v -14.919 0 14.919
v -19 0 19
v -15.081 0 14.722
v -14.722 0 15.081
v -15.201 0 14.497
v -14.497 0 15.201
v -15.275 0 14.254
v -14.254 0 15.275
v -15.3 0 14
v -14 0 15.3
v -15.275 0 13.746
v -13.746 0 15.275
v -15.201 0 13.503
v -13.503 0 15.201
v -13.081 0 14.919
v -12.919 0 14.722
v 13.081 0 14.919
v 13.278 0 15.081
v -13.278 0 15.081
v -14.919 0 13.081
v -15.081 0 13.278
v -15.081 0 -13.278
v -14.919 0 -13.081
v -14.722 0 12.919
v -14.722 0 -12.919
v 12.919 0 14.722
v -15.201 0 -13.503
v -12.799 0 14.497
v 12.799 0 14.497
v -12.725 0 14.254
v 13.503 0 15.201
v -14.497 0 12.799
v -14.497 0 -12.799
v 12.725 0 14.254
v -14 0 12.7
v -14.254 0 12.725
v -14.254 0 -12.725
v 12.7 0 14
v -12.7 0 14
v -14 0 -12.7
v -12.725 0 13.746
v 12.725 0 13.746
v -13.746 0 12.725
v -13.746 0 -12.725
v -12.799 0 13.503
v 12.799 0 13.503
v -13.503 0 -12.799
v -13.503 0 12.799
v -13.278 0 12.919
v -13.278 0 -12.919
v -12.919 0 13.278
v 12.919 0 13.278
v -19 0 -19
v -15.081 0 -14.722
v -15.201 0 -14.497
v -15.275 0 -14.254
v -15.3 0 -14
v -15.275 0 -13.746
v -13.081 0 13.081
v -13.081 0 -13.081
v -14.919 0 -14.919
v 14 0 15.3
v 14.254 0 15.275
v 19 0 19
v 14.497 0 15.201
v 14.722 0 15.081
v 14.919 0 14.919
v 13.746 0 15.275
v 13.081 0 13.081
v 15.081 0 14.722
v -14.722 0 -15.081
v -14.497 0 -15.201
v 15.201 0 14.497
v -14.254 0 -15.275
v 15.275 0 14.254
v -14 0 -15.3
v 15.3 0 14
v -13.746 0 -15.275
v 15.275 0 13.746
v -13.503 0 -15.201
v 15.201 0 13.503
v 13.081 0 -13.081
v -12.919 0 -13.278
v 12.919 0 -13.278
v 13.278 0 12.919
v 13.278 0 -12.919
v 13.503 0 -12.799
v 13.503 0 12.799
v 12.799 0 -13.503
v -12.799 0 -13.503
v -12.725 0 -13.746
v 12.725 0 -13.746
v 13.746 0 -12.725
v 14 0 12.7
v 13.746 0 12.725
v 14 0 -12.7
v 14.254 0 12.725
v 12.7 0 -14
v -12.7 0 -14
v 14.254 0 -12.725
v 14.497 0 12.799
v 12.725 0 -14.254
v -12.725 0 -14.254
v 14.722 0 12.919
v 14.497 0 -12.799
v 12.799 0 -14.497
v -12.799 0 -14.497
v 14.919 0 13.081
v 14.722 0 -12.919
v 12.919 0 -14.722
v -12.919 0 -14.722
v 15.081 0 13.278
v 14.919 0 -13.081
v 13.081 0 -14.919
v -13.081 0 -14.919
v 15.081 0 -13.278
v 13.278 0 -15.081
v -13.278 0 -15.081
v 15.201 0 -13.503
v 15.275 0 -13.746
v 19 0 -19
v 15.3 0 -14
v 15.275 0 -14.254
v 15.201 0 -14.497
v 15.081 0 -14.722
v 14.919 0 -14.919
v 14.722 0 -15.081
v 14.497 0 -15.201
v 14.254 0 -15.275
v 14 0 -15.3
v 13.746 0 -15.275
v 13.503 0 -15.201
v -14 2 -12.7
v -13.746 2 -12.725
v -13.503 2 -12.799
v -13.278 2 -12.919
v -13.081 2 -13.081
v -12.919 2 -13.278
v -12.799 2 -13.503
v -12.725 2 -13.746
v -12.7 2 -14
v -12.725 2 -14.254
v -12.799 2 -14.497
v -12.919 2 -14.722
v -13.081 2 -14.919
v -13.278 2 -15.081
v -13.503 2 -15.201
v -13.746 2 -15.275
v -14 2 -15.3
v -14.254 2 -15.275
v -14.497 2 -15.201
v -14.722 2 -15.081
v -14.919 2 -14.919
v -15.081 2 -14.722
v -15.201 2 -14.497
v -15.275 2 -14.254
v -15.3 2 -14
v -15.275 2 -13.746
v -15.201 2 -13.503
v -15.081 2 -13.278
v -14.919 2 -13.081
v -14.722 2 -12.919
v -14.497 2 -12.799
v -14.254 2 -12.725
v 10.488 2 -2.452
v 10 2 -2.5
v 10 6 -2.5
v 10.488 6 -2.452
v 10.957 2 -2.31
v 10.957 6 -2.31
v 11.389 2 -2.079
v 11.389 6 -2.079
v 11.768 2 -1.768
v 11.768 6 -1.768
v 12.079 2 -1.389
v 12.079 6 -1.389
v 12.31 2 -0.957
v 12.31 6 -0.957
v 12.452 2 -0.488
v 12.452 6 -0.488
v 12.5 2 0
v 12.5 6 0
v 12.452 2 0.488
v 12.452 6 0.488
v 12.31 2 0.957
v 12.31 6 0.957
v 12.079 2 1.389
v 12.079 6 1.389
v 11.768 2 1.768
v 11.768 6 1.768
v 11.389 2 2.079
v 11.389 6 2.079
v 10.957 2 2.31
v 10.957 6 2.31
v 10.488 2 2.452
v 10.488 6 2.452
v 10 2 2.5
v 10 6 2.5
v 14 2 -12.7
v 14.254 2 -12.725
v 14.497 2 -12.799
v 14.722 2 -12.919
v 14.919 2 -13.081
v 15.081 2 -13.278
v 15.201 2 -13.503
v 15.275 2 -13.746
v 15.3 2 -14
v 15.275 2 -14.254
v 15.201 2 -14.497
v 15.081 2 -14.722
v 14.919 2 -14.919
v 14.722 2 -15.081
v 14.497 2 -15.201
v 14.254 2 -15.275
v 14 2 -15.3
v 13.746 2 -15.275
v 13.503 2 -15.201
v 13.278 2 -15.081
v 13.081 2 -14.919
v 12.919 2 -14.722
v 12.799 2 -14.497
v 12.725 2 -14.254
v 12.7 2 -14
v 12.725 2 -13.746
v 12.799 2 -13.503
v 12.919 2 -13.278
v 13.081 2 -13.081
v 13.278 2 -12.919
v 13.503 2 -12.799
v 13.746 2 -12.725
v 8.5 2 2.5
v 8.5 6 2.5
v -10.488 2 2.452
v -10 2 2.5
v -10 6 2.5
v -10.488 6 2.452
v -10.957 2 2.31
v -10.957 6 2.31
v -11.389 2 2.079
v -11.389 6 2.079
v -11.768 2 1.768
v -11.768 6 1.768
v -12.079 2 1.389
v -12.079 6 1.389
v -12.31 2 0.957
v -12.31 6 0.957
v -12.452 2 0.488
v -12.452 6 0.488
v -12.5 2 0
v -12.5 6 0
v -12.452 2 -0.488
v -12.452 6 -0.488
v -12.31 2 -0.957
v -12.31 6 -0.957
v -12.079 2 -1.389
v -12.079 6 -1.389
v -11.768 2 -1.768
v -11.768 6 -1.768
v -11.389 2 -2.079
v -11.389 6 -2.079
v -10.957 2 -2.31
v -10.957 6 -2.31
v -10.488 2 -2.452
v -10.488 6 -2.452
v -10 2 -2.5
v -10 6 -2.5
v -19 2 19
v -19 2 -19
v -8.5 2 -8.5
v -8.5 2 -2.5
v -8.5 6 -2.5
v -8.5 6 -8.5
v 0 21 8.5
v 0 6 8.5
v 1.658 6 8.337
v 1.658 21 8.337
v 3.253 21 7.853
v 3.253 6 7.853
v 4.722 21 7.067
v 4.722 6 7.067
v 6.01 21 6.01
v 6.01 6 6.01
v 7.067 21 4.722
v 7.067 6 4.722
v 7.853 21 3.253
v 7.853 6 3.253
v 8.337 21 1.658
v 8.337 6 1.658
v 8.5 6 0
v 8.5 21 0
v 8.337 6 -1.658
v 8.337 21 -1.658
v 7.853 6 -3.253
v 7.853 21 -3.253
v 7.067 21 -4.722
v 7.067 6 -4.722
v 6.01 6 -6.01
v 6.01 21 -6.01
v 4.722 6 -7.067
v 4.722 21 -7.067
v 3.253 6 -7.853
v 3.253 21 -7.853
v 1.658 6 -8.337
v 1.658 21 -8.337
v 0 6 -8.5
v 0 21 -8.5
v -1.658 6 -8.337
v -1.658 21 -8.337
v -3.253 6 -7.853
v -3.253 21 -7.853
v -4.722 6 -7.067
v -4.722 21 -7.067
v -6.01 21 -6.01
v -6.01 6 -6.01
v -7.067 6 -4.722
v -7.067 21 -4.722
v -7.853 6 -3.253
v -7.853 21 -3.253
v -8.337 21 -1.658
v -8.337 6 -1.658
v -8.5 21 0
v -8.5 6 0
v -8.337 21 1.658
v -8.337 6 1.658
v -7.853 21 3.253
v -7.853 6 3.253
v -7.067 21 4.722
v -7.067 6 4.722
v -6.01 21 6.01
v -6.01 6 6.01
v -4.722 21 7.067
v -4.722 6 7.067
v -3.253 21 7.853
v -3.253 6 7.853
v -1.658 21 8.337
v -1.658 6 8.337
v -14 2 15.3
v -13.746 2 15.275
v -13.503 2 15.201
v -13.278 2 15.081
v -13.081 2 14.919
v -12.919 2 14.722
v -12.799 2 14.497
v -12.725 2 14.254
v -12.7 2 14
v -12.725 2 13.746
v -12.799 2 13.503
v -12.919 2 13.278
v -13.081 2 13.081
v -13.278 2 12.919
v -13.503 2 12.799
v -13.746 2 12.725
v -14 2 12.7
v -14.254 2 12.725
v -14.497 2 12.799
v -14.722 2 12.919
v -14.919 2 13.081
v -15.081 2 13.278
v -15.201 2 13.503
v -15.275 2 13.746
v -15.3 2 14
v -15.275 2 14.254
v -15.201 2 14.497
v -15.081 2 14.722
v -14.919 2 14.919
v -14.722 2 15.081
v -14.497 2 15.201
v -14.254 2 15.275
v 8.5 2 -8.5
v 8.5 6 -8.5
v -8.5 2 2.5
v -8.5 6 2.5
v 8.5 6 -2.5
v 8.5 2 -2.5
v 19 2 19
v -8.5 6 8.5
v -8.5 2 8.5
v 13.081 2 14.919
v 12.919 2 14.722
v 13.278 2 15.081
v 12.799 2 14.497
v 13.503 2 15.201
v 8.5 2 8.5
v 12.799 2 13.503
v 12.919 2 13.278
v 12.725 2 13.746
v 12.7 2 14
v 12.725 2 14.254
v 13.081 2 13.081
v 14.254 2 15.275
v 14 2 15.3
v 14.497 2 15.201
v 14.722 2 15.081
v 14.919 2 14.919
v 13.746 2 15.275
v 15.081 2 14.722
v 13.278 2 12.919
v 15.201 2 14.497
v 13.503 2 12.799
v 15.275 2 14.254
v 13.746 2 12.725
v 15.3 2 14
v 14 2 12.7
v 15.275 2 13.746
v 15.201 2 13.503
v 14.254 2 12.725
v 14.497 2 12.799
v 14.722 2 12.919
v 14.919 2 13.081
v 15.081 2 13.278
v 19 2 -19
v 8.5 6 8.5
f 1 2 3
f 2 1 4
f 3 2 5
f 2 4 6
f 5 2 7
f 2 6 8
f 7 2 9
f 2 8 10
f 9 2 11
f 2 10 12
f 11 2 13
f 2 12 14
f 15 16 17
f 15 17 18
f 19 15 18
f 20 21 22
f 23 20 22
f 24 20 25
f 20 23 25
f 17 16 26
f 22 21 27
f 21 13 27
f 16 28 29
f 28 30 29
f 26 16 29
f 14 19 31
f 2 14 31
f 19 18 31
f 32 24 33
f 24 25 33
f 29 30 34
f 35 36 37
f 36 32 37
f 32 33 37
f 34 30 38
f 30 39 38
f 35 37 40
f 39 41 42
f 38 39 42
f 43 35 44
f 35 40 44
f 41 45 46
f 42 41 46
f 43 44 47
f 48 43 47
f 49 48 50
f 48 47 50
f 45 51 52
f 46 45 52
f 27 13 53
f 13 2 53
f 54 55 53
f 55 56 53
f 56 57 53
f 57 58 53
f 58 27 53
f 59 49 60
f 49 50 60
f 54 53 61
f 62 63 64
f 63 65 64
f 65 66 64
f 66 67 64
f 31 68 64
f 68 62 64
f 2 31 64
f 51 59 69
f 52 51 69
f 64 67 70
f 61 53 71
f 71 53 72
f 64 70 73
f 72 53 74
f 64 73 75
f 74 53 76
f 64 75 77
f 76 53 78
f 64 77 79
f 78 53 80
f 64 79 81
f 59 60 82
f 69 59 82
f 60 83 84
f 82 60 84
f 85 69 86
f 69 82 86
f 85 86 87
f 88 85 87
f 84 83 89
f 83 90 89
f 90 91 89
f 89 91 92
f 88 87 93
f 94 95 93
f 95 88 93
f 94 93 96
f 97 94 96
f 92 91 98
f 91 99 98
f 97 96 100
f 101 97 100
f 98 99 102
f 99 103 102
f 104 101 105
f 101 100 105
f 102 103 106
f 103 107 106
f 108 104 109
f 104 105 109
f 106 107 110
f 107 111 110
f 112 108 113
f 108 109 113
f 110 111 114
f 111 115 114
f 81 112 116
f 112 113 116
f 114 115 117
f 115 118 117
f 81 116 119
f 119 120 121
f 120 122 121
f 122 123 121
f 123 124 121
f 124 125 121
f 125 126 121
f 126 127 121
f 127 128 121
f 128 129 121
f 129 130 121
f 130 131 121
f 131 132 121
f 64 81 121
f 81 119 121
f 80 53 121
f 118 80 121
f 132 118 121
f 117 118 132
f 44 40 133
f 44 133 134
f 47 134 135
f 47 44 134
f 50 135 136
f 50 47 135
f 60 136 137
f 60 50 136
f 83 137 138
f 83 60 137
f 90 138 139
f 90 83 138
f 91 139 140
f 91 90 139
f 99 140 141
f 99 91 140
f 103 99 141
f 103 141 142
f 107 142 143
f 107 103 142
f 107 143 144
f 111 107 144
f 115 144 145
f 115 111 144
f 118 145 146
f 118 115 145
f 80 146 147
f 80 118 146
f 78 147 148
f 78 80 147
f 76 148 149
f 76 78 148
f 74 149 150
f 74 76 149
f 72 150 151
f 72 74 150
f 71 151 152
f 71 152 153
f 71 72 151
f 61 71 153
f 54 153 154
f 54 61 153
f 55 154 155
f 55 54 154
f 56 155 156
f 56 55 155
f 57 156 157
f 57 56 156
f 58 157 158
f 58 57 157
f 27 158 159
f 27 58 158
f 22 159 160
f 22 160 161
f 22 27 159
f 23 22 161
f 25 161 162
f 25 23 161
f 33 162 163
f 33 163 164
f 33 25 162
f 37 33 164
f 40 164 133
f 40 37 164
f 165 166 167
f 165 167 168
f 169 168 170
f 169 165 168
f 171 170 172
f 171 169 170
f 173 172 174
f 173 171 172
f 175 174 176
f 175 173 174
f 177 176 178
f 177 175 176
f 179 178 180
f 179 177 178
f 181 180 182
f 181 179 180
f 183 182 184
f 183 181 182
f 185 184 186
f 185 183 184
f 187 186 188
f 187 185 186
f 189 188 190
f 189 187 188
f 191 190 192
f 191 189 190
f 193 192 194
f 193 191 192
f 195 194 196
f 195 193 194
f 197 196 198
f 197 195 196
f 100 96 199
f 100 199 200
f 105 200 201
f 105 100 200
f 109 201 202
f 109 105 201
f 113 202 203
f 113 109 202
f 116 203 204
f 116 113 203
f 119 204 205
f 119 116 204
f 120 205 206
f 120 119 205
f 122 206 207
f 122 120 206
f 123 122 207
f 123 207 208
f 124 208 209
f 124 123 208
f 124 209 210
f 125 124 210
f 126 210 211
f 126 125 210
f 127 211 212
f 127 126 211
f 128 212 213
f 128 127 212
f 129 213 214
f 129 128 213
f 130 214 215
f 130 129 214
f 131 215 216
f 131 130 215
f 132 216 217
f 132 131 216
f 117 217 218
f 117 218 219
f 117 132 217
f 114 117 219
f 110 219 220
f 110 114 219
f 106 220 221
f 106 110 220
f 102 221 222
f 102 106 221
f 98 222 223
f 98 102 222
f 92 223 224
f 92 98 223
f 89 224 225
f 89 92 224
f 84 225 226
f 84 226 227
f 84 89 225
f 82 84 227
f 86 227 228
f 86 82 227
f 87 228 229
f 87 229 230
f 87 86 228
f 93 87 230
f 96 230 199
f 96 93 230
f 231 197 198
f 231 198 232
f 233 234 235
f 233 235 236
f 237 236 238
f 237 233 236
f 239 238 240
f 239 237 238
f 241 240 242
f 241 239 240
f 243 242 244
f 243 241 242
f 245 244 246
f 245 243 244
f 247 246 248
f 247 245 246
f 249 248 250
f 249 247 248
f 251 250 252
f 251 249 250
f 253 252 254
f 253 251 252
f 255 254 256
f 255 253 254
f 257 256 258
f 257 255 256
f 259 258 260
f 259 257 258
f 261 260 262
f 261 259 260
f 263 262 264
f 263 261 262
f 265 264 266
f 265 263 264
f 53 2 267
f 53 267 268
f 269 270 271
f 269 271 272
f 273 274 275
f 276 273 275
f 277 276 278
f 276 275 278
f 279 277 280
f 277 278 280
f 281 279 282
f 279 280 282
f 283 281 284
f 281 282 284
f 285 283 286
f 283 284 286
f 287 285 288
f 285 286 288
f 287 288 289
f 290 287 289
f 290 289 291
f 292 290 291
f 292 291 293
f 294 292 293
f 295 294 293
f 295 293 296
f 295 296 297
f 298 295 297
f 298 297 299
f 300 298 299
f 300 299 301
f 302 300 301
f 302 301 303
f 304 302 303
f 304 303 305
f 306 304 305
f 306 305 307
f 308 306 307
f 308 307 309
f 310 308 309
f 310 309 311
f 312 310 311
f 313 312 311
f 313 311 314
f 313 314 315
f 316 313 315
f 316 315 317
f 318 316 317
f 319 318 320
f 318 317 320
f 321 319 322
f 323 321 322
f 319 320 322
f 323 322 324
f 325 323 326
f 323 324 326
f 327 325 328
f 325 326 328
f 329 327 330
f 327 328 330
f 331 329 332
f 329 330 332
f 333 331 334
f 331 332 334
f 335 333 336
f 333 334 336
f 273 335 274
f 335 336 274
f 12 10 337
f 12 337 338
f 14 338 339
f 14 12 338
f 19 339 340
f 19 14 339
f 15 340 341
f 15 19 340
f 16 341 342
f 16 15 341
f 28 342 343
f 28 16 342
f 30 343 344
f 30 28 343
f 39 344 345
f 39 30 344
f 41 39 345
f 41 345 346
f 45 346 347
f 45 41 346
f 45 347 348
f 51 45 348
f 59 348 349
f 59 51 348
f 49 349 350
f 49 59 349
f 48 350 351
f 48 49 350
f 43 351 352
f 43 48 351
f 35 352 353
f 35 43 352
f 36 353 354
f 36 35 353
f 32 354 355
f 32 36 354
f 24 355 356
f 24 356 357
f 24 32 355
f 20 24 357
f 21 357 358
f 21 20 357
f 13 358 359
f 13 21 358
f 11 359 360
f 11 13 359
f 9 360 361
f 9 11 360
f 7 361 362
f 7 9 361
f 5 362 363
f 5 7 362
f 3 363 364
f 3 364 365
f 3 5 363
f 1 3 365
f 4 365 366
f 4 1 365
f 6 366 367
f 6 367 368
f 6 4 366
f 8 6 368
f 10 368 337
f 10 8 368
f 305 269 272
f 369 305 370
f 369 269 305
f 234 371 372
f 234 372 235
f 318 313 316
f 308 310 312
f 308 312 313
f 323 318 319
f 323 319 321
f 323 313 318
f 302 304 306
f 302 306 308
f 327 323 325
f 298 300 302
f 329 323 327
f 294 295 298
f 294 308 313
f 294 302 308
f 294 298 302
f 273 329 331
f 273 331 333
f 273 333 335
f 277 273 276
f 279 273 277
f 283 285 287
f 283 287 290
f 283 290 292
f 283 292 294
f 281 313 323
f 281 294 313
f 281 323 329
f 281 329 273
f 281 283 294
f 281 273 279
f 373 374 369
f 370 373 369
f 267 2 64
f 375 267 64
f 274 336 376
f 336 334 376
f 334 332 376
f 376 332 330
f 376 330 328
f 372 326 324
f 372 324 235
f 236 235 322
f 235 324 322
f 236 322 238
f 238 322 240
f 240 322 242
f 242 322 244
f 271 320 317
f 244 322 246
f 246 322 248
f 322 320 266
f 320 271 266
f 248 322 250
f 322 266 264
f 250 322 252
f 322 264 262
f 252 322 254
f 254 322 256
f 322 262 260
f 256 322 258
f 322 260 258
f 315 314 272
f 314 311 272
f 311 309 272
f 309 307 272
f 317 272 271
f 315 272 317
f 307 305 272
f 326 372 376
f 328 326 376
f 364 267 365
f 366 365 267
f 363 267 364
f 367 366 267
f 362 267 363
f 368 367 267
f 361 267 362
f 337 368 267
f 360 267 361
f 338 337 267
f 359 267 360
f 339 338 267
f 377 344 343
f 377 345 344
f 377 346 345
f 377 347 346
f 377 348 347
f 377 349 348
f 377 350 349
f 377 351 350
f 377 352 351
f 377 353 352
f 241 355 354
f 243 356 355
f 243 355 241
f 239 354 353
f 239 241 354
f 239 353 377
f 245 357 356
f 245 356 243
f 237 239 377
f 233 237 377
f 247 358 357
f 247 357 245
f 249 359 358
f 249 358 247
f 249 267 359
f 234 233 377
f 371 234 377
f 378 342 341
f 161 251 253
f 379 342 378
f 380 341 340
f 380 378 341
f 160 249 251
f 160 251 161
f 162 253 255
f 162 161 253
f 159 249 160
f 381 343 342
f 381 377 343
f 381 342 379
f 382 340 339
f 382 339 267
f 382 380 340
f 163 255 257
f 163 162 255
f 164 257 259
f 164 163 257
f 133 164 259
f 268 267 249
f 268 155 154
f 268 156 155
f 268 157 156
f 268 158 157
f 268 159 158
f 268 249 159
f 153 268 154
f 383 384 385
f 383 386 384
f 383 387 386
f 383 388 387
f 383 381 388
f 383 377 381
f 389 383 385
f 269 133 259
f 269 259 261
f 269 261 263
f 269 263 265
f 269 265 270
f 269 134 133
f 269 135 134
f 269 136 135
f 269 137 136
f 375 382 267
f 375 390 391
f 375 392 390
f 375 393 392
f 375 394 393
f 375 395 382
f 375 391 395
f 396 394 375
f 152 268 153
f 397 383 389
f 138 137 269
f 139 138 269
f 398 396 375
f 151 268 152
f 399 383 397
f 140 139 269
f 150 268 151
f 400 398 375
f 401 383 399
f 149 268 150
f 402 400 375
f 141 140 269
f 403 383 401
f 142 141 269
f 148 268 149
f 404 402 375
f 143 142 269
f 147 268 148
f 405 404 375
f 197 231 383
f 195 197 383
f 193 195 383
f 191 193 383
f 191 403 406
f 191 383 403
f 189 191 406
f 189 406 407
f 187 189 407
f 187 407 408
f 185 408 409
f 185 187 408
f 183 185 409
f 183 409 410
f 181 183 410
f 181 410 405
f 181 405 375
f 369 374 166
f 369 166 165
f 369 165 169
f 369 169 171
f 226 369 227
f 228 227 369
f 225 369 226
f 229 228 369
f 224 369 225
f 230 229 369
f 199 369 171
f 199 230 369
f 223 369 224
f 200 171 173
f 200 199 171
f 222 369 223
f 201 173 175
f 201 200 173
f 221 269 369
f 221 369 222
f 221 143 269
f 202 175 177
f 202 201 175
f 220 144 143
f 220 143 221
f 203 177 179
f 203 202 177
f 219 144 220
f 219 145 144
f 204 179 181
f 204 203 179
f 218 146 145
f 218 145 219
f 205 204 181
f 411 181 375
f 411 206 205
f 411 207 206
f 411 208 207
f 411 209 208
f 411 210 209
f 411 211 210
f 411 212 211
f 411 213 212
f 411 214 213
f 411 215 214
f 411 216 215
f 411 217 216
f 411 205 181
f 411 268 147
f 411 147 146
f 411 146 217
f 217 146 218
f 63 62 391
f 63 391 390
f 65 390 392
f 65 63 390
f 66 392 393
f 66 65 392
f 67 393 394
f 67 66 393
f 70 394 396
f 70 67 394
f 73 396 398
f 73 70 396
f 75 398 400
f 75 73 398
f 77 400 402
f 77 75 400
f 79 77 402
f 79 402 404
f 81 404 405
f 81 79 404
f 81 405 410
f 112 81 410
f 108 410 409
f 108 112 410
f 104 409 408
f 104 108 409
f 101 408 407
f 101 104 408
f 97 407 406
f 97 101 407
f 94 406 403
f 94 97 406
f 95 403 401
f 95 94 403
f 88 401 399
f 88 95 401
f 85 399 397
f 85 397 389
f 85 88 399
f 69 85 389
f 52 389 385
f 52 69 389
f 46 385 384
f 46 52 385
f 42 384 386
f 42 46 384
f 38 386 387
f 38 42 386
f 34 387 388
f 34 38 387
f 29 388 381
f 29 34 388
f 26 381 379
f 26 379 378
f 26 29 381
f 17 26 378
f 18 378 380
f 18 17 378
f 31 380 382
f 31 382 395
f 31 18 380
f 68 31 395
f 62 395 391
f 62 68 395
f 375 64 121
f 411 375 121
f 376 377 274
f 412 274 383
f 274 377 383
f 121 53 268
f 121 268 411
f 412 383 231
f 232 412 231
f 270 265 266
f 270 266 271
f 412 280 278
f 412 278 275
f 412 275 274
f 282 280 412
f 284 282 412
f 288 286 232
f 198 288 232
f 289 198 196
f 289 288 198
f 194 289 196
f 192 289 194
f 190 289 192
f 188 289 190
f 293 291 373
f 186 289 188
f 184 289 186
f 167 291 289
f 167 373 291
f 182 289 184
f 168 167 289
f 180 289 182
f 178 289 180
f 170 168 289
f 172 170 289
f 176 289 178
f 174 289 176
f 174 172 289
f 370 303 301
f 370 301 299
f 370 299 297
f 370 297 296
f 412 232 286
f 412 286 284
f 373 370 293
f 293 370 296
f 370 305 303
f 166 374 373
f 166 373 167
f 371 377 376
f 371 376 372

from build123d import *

# Parameters (mm, degrees)
SKETCH_1_W      = 38
SKETCH_1_H      = 38
SKETCH_1_R      = 1.3
EXTRUDE_1_DEPTH = 2
SKETCH_2_W      = 17
SKETCH_2_H      = 17
EXTRUDE_2_DEPTH = 4
SKETCH_3_R      = 8.5
EXTRUDE_3_DEPTH = 15
EXTRUDE_4_DEPTH = 4


with BuildPart() as part:
    # 草图1 → 凸台-拉伸1 (new body)
    with BuildSketch(Plane(origin=(0, 0, 0), x_dir=(1, 0, 0), z_dir=(0, 1, 0))):
        Rectangle(SKETCH_1_W, SKETCH_1_H)
        with Locations(Location((-14, -14, 0), (0, 0, 270))):
            Circle(SKETCH_1_R, mode=Mode.SUBTRACT)
        with Locations(Location((-14, 14, 0), (0, 0, 270))):
            Circle(SKETCH_1_R, mode=Mode.SUBTRACT)
        with Locations(Location((14, 14, 0), (0, 0, 270))):
            Circle(SKETCH_1_R, mode=Mode.SUBTRACT)
        with Locations(Location((14, -14, 0), (0, 0, 270))):
            Circle(SKETCH_1_R, mode=Mode.SUBTRACT)
    extrude(amount=EXTRUDE_1_DEPTH)

    # 草图2 → 凸台-拉伸2 (add)
    with BuildSketch(Plane(origin=(0, 2, 0), x_dir=(1, 0, 0), z_dir=(0, 1, 0))):
        Rectangle(SKETCH_2_W, SKETCH_2_H)
    extrude(amount=EXTRUDE_2_DEPTH)

    # 草图3 → 凸台-拉伸3 (add)
    with BuildSketch(Plane(origin=(0, 6, 0), x_dir=(1, 0, 0), z_dir=(0, 1, 0))):
        with Locations(Location((0, 0, 0), (0, 0, 270))):
            Circle(SKETCH_3_R)
    extrude(amount=EXTRUDE_3_DEPTH)

    # 草图4 → 凸台-拉伸4 (add)
    with BuildSketch(Plane(origin=(0, 2, 0), x_dir=(1, 0, 0), z_dir=(0, 1, 0))):
        with BuildLine():
            Line((-10, 2.5), (10, 2.5))
            ThreePointArc((10, 2.5), (12.5, 0), (10, -2.5))
            Line((10, -2.5), (-10, -2.5))
            ThreePointArc((-10, -2.5), (-12.5, 0), (-10, 2.5))
        make_face()
    extrude(amount=EXTRUDE_4_DEPTH)


solid = part.part
